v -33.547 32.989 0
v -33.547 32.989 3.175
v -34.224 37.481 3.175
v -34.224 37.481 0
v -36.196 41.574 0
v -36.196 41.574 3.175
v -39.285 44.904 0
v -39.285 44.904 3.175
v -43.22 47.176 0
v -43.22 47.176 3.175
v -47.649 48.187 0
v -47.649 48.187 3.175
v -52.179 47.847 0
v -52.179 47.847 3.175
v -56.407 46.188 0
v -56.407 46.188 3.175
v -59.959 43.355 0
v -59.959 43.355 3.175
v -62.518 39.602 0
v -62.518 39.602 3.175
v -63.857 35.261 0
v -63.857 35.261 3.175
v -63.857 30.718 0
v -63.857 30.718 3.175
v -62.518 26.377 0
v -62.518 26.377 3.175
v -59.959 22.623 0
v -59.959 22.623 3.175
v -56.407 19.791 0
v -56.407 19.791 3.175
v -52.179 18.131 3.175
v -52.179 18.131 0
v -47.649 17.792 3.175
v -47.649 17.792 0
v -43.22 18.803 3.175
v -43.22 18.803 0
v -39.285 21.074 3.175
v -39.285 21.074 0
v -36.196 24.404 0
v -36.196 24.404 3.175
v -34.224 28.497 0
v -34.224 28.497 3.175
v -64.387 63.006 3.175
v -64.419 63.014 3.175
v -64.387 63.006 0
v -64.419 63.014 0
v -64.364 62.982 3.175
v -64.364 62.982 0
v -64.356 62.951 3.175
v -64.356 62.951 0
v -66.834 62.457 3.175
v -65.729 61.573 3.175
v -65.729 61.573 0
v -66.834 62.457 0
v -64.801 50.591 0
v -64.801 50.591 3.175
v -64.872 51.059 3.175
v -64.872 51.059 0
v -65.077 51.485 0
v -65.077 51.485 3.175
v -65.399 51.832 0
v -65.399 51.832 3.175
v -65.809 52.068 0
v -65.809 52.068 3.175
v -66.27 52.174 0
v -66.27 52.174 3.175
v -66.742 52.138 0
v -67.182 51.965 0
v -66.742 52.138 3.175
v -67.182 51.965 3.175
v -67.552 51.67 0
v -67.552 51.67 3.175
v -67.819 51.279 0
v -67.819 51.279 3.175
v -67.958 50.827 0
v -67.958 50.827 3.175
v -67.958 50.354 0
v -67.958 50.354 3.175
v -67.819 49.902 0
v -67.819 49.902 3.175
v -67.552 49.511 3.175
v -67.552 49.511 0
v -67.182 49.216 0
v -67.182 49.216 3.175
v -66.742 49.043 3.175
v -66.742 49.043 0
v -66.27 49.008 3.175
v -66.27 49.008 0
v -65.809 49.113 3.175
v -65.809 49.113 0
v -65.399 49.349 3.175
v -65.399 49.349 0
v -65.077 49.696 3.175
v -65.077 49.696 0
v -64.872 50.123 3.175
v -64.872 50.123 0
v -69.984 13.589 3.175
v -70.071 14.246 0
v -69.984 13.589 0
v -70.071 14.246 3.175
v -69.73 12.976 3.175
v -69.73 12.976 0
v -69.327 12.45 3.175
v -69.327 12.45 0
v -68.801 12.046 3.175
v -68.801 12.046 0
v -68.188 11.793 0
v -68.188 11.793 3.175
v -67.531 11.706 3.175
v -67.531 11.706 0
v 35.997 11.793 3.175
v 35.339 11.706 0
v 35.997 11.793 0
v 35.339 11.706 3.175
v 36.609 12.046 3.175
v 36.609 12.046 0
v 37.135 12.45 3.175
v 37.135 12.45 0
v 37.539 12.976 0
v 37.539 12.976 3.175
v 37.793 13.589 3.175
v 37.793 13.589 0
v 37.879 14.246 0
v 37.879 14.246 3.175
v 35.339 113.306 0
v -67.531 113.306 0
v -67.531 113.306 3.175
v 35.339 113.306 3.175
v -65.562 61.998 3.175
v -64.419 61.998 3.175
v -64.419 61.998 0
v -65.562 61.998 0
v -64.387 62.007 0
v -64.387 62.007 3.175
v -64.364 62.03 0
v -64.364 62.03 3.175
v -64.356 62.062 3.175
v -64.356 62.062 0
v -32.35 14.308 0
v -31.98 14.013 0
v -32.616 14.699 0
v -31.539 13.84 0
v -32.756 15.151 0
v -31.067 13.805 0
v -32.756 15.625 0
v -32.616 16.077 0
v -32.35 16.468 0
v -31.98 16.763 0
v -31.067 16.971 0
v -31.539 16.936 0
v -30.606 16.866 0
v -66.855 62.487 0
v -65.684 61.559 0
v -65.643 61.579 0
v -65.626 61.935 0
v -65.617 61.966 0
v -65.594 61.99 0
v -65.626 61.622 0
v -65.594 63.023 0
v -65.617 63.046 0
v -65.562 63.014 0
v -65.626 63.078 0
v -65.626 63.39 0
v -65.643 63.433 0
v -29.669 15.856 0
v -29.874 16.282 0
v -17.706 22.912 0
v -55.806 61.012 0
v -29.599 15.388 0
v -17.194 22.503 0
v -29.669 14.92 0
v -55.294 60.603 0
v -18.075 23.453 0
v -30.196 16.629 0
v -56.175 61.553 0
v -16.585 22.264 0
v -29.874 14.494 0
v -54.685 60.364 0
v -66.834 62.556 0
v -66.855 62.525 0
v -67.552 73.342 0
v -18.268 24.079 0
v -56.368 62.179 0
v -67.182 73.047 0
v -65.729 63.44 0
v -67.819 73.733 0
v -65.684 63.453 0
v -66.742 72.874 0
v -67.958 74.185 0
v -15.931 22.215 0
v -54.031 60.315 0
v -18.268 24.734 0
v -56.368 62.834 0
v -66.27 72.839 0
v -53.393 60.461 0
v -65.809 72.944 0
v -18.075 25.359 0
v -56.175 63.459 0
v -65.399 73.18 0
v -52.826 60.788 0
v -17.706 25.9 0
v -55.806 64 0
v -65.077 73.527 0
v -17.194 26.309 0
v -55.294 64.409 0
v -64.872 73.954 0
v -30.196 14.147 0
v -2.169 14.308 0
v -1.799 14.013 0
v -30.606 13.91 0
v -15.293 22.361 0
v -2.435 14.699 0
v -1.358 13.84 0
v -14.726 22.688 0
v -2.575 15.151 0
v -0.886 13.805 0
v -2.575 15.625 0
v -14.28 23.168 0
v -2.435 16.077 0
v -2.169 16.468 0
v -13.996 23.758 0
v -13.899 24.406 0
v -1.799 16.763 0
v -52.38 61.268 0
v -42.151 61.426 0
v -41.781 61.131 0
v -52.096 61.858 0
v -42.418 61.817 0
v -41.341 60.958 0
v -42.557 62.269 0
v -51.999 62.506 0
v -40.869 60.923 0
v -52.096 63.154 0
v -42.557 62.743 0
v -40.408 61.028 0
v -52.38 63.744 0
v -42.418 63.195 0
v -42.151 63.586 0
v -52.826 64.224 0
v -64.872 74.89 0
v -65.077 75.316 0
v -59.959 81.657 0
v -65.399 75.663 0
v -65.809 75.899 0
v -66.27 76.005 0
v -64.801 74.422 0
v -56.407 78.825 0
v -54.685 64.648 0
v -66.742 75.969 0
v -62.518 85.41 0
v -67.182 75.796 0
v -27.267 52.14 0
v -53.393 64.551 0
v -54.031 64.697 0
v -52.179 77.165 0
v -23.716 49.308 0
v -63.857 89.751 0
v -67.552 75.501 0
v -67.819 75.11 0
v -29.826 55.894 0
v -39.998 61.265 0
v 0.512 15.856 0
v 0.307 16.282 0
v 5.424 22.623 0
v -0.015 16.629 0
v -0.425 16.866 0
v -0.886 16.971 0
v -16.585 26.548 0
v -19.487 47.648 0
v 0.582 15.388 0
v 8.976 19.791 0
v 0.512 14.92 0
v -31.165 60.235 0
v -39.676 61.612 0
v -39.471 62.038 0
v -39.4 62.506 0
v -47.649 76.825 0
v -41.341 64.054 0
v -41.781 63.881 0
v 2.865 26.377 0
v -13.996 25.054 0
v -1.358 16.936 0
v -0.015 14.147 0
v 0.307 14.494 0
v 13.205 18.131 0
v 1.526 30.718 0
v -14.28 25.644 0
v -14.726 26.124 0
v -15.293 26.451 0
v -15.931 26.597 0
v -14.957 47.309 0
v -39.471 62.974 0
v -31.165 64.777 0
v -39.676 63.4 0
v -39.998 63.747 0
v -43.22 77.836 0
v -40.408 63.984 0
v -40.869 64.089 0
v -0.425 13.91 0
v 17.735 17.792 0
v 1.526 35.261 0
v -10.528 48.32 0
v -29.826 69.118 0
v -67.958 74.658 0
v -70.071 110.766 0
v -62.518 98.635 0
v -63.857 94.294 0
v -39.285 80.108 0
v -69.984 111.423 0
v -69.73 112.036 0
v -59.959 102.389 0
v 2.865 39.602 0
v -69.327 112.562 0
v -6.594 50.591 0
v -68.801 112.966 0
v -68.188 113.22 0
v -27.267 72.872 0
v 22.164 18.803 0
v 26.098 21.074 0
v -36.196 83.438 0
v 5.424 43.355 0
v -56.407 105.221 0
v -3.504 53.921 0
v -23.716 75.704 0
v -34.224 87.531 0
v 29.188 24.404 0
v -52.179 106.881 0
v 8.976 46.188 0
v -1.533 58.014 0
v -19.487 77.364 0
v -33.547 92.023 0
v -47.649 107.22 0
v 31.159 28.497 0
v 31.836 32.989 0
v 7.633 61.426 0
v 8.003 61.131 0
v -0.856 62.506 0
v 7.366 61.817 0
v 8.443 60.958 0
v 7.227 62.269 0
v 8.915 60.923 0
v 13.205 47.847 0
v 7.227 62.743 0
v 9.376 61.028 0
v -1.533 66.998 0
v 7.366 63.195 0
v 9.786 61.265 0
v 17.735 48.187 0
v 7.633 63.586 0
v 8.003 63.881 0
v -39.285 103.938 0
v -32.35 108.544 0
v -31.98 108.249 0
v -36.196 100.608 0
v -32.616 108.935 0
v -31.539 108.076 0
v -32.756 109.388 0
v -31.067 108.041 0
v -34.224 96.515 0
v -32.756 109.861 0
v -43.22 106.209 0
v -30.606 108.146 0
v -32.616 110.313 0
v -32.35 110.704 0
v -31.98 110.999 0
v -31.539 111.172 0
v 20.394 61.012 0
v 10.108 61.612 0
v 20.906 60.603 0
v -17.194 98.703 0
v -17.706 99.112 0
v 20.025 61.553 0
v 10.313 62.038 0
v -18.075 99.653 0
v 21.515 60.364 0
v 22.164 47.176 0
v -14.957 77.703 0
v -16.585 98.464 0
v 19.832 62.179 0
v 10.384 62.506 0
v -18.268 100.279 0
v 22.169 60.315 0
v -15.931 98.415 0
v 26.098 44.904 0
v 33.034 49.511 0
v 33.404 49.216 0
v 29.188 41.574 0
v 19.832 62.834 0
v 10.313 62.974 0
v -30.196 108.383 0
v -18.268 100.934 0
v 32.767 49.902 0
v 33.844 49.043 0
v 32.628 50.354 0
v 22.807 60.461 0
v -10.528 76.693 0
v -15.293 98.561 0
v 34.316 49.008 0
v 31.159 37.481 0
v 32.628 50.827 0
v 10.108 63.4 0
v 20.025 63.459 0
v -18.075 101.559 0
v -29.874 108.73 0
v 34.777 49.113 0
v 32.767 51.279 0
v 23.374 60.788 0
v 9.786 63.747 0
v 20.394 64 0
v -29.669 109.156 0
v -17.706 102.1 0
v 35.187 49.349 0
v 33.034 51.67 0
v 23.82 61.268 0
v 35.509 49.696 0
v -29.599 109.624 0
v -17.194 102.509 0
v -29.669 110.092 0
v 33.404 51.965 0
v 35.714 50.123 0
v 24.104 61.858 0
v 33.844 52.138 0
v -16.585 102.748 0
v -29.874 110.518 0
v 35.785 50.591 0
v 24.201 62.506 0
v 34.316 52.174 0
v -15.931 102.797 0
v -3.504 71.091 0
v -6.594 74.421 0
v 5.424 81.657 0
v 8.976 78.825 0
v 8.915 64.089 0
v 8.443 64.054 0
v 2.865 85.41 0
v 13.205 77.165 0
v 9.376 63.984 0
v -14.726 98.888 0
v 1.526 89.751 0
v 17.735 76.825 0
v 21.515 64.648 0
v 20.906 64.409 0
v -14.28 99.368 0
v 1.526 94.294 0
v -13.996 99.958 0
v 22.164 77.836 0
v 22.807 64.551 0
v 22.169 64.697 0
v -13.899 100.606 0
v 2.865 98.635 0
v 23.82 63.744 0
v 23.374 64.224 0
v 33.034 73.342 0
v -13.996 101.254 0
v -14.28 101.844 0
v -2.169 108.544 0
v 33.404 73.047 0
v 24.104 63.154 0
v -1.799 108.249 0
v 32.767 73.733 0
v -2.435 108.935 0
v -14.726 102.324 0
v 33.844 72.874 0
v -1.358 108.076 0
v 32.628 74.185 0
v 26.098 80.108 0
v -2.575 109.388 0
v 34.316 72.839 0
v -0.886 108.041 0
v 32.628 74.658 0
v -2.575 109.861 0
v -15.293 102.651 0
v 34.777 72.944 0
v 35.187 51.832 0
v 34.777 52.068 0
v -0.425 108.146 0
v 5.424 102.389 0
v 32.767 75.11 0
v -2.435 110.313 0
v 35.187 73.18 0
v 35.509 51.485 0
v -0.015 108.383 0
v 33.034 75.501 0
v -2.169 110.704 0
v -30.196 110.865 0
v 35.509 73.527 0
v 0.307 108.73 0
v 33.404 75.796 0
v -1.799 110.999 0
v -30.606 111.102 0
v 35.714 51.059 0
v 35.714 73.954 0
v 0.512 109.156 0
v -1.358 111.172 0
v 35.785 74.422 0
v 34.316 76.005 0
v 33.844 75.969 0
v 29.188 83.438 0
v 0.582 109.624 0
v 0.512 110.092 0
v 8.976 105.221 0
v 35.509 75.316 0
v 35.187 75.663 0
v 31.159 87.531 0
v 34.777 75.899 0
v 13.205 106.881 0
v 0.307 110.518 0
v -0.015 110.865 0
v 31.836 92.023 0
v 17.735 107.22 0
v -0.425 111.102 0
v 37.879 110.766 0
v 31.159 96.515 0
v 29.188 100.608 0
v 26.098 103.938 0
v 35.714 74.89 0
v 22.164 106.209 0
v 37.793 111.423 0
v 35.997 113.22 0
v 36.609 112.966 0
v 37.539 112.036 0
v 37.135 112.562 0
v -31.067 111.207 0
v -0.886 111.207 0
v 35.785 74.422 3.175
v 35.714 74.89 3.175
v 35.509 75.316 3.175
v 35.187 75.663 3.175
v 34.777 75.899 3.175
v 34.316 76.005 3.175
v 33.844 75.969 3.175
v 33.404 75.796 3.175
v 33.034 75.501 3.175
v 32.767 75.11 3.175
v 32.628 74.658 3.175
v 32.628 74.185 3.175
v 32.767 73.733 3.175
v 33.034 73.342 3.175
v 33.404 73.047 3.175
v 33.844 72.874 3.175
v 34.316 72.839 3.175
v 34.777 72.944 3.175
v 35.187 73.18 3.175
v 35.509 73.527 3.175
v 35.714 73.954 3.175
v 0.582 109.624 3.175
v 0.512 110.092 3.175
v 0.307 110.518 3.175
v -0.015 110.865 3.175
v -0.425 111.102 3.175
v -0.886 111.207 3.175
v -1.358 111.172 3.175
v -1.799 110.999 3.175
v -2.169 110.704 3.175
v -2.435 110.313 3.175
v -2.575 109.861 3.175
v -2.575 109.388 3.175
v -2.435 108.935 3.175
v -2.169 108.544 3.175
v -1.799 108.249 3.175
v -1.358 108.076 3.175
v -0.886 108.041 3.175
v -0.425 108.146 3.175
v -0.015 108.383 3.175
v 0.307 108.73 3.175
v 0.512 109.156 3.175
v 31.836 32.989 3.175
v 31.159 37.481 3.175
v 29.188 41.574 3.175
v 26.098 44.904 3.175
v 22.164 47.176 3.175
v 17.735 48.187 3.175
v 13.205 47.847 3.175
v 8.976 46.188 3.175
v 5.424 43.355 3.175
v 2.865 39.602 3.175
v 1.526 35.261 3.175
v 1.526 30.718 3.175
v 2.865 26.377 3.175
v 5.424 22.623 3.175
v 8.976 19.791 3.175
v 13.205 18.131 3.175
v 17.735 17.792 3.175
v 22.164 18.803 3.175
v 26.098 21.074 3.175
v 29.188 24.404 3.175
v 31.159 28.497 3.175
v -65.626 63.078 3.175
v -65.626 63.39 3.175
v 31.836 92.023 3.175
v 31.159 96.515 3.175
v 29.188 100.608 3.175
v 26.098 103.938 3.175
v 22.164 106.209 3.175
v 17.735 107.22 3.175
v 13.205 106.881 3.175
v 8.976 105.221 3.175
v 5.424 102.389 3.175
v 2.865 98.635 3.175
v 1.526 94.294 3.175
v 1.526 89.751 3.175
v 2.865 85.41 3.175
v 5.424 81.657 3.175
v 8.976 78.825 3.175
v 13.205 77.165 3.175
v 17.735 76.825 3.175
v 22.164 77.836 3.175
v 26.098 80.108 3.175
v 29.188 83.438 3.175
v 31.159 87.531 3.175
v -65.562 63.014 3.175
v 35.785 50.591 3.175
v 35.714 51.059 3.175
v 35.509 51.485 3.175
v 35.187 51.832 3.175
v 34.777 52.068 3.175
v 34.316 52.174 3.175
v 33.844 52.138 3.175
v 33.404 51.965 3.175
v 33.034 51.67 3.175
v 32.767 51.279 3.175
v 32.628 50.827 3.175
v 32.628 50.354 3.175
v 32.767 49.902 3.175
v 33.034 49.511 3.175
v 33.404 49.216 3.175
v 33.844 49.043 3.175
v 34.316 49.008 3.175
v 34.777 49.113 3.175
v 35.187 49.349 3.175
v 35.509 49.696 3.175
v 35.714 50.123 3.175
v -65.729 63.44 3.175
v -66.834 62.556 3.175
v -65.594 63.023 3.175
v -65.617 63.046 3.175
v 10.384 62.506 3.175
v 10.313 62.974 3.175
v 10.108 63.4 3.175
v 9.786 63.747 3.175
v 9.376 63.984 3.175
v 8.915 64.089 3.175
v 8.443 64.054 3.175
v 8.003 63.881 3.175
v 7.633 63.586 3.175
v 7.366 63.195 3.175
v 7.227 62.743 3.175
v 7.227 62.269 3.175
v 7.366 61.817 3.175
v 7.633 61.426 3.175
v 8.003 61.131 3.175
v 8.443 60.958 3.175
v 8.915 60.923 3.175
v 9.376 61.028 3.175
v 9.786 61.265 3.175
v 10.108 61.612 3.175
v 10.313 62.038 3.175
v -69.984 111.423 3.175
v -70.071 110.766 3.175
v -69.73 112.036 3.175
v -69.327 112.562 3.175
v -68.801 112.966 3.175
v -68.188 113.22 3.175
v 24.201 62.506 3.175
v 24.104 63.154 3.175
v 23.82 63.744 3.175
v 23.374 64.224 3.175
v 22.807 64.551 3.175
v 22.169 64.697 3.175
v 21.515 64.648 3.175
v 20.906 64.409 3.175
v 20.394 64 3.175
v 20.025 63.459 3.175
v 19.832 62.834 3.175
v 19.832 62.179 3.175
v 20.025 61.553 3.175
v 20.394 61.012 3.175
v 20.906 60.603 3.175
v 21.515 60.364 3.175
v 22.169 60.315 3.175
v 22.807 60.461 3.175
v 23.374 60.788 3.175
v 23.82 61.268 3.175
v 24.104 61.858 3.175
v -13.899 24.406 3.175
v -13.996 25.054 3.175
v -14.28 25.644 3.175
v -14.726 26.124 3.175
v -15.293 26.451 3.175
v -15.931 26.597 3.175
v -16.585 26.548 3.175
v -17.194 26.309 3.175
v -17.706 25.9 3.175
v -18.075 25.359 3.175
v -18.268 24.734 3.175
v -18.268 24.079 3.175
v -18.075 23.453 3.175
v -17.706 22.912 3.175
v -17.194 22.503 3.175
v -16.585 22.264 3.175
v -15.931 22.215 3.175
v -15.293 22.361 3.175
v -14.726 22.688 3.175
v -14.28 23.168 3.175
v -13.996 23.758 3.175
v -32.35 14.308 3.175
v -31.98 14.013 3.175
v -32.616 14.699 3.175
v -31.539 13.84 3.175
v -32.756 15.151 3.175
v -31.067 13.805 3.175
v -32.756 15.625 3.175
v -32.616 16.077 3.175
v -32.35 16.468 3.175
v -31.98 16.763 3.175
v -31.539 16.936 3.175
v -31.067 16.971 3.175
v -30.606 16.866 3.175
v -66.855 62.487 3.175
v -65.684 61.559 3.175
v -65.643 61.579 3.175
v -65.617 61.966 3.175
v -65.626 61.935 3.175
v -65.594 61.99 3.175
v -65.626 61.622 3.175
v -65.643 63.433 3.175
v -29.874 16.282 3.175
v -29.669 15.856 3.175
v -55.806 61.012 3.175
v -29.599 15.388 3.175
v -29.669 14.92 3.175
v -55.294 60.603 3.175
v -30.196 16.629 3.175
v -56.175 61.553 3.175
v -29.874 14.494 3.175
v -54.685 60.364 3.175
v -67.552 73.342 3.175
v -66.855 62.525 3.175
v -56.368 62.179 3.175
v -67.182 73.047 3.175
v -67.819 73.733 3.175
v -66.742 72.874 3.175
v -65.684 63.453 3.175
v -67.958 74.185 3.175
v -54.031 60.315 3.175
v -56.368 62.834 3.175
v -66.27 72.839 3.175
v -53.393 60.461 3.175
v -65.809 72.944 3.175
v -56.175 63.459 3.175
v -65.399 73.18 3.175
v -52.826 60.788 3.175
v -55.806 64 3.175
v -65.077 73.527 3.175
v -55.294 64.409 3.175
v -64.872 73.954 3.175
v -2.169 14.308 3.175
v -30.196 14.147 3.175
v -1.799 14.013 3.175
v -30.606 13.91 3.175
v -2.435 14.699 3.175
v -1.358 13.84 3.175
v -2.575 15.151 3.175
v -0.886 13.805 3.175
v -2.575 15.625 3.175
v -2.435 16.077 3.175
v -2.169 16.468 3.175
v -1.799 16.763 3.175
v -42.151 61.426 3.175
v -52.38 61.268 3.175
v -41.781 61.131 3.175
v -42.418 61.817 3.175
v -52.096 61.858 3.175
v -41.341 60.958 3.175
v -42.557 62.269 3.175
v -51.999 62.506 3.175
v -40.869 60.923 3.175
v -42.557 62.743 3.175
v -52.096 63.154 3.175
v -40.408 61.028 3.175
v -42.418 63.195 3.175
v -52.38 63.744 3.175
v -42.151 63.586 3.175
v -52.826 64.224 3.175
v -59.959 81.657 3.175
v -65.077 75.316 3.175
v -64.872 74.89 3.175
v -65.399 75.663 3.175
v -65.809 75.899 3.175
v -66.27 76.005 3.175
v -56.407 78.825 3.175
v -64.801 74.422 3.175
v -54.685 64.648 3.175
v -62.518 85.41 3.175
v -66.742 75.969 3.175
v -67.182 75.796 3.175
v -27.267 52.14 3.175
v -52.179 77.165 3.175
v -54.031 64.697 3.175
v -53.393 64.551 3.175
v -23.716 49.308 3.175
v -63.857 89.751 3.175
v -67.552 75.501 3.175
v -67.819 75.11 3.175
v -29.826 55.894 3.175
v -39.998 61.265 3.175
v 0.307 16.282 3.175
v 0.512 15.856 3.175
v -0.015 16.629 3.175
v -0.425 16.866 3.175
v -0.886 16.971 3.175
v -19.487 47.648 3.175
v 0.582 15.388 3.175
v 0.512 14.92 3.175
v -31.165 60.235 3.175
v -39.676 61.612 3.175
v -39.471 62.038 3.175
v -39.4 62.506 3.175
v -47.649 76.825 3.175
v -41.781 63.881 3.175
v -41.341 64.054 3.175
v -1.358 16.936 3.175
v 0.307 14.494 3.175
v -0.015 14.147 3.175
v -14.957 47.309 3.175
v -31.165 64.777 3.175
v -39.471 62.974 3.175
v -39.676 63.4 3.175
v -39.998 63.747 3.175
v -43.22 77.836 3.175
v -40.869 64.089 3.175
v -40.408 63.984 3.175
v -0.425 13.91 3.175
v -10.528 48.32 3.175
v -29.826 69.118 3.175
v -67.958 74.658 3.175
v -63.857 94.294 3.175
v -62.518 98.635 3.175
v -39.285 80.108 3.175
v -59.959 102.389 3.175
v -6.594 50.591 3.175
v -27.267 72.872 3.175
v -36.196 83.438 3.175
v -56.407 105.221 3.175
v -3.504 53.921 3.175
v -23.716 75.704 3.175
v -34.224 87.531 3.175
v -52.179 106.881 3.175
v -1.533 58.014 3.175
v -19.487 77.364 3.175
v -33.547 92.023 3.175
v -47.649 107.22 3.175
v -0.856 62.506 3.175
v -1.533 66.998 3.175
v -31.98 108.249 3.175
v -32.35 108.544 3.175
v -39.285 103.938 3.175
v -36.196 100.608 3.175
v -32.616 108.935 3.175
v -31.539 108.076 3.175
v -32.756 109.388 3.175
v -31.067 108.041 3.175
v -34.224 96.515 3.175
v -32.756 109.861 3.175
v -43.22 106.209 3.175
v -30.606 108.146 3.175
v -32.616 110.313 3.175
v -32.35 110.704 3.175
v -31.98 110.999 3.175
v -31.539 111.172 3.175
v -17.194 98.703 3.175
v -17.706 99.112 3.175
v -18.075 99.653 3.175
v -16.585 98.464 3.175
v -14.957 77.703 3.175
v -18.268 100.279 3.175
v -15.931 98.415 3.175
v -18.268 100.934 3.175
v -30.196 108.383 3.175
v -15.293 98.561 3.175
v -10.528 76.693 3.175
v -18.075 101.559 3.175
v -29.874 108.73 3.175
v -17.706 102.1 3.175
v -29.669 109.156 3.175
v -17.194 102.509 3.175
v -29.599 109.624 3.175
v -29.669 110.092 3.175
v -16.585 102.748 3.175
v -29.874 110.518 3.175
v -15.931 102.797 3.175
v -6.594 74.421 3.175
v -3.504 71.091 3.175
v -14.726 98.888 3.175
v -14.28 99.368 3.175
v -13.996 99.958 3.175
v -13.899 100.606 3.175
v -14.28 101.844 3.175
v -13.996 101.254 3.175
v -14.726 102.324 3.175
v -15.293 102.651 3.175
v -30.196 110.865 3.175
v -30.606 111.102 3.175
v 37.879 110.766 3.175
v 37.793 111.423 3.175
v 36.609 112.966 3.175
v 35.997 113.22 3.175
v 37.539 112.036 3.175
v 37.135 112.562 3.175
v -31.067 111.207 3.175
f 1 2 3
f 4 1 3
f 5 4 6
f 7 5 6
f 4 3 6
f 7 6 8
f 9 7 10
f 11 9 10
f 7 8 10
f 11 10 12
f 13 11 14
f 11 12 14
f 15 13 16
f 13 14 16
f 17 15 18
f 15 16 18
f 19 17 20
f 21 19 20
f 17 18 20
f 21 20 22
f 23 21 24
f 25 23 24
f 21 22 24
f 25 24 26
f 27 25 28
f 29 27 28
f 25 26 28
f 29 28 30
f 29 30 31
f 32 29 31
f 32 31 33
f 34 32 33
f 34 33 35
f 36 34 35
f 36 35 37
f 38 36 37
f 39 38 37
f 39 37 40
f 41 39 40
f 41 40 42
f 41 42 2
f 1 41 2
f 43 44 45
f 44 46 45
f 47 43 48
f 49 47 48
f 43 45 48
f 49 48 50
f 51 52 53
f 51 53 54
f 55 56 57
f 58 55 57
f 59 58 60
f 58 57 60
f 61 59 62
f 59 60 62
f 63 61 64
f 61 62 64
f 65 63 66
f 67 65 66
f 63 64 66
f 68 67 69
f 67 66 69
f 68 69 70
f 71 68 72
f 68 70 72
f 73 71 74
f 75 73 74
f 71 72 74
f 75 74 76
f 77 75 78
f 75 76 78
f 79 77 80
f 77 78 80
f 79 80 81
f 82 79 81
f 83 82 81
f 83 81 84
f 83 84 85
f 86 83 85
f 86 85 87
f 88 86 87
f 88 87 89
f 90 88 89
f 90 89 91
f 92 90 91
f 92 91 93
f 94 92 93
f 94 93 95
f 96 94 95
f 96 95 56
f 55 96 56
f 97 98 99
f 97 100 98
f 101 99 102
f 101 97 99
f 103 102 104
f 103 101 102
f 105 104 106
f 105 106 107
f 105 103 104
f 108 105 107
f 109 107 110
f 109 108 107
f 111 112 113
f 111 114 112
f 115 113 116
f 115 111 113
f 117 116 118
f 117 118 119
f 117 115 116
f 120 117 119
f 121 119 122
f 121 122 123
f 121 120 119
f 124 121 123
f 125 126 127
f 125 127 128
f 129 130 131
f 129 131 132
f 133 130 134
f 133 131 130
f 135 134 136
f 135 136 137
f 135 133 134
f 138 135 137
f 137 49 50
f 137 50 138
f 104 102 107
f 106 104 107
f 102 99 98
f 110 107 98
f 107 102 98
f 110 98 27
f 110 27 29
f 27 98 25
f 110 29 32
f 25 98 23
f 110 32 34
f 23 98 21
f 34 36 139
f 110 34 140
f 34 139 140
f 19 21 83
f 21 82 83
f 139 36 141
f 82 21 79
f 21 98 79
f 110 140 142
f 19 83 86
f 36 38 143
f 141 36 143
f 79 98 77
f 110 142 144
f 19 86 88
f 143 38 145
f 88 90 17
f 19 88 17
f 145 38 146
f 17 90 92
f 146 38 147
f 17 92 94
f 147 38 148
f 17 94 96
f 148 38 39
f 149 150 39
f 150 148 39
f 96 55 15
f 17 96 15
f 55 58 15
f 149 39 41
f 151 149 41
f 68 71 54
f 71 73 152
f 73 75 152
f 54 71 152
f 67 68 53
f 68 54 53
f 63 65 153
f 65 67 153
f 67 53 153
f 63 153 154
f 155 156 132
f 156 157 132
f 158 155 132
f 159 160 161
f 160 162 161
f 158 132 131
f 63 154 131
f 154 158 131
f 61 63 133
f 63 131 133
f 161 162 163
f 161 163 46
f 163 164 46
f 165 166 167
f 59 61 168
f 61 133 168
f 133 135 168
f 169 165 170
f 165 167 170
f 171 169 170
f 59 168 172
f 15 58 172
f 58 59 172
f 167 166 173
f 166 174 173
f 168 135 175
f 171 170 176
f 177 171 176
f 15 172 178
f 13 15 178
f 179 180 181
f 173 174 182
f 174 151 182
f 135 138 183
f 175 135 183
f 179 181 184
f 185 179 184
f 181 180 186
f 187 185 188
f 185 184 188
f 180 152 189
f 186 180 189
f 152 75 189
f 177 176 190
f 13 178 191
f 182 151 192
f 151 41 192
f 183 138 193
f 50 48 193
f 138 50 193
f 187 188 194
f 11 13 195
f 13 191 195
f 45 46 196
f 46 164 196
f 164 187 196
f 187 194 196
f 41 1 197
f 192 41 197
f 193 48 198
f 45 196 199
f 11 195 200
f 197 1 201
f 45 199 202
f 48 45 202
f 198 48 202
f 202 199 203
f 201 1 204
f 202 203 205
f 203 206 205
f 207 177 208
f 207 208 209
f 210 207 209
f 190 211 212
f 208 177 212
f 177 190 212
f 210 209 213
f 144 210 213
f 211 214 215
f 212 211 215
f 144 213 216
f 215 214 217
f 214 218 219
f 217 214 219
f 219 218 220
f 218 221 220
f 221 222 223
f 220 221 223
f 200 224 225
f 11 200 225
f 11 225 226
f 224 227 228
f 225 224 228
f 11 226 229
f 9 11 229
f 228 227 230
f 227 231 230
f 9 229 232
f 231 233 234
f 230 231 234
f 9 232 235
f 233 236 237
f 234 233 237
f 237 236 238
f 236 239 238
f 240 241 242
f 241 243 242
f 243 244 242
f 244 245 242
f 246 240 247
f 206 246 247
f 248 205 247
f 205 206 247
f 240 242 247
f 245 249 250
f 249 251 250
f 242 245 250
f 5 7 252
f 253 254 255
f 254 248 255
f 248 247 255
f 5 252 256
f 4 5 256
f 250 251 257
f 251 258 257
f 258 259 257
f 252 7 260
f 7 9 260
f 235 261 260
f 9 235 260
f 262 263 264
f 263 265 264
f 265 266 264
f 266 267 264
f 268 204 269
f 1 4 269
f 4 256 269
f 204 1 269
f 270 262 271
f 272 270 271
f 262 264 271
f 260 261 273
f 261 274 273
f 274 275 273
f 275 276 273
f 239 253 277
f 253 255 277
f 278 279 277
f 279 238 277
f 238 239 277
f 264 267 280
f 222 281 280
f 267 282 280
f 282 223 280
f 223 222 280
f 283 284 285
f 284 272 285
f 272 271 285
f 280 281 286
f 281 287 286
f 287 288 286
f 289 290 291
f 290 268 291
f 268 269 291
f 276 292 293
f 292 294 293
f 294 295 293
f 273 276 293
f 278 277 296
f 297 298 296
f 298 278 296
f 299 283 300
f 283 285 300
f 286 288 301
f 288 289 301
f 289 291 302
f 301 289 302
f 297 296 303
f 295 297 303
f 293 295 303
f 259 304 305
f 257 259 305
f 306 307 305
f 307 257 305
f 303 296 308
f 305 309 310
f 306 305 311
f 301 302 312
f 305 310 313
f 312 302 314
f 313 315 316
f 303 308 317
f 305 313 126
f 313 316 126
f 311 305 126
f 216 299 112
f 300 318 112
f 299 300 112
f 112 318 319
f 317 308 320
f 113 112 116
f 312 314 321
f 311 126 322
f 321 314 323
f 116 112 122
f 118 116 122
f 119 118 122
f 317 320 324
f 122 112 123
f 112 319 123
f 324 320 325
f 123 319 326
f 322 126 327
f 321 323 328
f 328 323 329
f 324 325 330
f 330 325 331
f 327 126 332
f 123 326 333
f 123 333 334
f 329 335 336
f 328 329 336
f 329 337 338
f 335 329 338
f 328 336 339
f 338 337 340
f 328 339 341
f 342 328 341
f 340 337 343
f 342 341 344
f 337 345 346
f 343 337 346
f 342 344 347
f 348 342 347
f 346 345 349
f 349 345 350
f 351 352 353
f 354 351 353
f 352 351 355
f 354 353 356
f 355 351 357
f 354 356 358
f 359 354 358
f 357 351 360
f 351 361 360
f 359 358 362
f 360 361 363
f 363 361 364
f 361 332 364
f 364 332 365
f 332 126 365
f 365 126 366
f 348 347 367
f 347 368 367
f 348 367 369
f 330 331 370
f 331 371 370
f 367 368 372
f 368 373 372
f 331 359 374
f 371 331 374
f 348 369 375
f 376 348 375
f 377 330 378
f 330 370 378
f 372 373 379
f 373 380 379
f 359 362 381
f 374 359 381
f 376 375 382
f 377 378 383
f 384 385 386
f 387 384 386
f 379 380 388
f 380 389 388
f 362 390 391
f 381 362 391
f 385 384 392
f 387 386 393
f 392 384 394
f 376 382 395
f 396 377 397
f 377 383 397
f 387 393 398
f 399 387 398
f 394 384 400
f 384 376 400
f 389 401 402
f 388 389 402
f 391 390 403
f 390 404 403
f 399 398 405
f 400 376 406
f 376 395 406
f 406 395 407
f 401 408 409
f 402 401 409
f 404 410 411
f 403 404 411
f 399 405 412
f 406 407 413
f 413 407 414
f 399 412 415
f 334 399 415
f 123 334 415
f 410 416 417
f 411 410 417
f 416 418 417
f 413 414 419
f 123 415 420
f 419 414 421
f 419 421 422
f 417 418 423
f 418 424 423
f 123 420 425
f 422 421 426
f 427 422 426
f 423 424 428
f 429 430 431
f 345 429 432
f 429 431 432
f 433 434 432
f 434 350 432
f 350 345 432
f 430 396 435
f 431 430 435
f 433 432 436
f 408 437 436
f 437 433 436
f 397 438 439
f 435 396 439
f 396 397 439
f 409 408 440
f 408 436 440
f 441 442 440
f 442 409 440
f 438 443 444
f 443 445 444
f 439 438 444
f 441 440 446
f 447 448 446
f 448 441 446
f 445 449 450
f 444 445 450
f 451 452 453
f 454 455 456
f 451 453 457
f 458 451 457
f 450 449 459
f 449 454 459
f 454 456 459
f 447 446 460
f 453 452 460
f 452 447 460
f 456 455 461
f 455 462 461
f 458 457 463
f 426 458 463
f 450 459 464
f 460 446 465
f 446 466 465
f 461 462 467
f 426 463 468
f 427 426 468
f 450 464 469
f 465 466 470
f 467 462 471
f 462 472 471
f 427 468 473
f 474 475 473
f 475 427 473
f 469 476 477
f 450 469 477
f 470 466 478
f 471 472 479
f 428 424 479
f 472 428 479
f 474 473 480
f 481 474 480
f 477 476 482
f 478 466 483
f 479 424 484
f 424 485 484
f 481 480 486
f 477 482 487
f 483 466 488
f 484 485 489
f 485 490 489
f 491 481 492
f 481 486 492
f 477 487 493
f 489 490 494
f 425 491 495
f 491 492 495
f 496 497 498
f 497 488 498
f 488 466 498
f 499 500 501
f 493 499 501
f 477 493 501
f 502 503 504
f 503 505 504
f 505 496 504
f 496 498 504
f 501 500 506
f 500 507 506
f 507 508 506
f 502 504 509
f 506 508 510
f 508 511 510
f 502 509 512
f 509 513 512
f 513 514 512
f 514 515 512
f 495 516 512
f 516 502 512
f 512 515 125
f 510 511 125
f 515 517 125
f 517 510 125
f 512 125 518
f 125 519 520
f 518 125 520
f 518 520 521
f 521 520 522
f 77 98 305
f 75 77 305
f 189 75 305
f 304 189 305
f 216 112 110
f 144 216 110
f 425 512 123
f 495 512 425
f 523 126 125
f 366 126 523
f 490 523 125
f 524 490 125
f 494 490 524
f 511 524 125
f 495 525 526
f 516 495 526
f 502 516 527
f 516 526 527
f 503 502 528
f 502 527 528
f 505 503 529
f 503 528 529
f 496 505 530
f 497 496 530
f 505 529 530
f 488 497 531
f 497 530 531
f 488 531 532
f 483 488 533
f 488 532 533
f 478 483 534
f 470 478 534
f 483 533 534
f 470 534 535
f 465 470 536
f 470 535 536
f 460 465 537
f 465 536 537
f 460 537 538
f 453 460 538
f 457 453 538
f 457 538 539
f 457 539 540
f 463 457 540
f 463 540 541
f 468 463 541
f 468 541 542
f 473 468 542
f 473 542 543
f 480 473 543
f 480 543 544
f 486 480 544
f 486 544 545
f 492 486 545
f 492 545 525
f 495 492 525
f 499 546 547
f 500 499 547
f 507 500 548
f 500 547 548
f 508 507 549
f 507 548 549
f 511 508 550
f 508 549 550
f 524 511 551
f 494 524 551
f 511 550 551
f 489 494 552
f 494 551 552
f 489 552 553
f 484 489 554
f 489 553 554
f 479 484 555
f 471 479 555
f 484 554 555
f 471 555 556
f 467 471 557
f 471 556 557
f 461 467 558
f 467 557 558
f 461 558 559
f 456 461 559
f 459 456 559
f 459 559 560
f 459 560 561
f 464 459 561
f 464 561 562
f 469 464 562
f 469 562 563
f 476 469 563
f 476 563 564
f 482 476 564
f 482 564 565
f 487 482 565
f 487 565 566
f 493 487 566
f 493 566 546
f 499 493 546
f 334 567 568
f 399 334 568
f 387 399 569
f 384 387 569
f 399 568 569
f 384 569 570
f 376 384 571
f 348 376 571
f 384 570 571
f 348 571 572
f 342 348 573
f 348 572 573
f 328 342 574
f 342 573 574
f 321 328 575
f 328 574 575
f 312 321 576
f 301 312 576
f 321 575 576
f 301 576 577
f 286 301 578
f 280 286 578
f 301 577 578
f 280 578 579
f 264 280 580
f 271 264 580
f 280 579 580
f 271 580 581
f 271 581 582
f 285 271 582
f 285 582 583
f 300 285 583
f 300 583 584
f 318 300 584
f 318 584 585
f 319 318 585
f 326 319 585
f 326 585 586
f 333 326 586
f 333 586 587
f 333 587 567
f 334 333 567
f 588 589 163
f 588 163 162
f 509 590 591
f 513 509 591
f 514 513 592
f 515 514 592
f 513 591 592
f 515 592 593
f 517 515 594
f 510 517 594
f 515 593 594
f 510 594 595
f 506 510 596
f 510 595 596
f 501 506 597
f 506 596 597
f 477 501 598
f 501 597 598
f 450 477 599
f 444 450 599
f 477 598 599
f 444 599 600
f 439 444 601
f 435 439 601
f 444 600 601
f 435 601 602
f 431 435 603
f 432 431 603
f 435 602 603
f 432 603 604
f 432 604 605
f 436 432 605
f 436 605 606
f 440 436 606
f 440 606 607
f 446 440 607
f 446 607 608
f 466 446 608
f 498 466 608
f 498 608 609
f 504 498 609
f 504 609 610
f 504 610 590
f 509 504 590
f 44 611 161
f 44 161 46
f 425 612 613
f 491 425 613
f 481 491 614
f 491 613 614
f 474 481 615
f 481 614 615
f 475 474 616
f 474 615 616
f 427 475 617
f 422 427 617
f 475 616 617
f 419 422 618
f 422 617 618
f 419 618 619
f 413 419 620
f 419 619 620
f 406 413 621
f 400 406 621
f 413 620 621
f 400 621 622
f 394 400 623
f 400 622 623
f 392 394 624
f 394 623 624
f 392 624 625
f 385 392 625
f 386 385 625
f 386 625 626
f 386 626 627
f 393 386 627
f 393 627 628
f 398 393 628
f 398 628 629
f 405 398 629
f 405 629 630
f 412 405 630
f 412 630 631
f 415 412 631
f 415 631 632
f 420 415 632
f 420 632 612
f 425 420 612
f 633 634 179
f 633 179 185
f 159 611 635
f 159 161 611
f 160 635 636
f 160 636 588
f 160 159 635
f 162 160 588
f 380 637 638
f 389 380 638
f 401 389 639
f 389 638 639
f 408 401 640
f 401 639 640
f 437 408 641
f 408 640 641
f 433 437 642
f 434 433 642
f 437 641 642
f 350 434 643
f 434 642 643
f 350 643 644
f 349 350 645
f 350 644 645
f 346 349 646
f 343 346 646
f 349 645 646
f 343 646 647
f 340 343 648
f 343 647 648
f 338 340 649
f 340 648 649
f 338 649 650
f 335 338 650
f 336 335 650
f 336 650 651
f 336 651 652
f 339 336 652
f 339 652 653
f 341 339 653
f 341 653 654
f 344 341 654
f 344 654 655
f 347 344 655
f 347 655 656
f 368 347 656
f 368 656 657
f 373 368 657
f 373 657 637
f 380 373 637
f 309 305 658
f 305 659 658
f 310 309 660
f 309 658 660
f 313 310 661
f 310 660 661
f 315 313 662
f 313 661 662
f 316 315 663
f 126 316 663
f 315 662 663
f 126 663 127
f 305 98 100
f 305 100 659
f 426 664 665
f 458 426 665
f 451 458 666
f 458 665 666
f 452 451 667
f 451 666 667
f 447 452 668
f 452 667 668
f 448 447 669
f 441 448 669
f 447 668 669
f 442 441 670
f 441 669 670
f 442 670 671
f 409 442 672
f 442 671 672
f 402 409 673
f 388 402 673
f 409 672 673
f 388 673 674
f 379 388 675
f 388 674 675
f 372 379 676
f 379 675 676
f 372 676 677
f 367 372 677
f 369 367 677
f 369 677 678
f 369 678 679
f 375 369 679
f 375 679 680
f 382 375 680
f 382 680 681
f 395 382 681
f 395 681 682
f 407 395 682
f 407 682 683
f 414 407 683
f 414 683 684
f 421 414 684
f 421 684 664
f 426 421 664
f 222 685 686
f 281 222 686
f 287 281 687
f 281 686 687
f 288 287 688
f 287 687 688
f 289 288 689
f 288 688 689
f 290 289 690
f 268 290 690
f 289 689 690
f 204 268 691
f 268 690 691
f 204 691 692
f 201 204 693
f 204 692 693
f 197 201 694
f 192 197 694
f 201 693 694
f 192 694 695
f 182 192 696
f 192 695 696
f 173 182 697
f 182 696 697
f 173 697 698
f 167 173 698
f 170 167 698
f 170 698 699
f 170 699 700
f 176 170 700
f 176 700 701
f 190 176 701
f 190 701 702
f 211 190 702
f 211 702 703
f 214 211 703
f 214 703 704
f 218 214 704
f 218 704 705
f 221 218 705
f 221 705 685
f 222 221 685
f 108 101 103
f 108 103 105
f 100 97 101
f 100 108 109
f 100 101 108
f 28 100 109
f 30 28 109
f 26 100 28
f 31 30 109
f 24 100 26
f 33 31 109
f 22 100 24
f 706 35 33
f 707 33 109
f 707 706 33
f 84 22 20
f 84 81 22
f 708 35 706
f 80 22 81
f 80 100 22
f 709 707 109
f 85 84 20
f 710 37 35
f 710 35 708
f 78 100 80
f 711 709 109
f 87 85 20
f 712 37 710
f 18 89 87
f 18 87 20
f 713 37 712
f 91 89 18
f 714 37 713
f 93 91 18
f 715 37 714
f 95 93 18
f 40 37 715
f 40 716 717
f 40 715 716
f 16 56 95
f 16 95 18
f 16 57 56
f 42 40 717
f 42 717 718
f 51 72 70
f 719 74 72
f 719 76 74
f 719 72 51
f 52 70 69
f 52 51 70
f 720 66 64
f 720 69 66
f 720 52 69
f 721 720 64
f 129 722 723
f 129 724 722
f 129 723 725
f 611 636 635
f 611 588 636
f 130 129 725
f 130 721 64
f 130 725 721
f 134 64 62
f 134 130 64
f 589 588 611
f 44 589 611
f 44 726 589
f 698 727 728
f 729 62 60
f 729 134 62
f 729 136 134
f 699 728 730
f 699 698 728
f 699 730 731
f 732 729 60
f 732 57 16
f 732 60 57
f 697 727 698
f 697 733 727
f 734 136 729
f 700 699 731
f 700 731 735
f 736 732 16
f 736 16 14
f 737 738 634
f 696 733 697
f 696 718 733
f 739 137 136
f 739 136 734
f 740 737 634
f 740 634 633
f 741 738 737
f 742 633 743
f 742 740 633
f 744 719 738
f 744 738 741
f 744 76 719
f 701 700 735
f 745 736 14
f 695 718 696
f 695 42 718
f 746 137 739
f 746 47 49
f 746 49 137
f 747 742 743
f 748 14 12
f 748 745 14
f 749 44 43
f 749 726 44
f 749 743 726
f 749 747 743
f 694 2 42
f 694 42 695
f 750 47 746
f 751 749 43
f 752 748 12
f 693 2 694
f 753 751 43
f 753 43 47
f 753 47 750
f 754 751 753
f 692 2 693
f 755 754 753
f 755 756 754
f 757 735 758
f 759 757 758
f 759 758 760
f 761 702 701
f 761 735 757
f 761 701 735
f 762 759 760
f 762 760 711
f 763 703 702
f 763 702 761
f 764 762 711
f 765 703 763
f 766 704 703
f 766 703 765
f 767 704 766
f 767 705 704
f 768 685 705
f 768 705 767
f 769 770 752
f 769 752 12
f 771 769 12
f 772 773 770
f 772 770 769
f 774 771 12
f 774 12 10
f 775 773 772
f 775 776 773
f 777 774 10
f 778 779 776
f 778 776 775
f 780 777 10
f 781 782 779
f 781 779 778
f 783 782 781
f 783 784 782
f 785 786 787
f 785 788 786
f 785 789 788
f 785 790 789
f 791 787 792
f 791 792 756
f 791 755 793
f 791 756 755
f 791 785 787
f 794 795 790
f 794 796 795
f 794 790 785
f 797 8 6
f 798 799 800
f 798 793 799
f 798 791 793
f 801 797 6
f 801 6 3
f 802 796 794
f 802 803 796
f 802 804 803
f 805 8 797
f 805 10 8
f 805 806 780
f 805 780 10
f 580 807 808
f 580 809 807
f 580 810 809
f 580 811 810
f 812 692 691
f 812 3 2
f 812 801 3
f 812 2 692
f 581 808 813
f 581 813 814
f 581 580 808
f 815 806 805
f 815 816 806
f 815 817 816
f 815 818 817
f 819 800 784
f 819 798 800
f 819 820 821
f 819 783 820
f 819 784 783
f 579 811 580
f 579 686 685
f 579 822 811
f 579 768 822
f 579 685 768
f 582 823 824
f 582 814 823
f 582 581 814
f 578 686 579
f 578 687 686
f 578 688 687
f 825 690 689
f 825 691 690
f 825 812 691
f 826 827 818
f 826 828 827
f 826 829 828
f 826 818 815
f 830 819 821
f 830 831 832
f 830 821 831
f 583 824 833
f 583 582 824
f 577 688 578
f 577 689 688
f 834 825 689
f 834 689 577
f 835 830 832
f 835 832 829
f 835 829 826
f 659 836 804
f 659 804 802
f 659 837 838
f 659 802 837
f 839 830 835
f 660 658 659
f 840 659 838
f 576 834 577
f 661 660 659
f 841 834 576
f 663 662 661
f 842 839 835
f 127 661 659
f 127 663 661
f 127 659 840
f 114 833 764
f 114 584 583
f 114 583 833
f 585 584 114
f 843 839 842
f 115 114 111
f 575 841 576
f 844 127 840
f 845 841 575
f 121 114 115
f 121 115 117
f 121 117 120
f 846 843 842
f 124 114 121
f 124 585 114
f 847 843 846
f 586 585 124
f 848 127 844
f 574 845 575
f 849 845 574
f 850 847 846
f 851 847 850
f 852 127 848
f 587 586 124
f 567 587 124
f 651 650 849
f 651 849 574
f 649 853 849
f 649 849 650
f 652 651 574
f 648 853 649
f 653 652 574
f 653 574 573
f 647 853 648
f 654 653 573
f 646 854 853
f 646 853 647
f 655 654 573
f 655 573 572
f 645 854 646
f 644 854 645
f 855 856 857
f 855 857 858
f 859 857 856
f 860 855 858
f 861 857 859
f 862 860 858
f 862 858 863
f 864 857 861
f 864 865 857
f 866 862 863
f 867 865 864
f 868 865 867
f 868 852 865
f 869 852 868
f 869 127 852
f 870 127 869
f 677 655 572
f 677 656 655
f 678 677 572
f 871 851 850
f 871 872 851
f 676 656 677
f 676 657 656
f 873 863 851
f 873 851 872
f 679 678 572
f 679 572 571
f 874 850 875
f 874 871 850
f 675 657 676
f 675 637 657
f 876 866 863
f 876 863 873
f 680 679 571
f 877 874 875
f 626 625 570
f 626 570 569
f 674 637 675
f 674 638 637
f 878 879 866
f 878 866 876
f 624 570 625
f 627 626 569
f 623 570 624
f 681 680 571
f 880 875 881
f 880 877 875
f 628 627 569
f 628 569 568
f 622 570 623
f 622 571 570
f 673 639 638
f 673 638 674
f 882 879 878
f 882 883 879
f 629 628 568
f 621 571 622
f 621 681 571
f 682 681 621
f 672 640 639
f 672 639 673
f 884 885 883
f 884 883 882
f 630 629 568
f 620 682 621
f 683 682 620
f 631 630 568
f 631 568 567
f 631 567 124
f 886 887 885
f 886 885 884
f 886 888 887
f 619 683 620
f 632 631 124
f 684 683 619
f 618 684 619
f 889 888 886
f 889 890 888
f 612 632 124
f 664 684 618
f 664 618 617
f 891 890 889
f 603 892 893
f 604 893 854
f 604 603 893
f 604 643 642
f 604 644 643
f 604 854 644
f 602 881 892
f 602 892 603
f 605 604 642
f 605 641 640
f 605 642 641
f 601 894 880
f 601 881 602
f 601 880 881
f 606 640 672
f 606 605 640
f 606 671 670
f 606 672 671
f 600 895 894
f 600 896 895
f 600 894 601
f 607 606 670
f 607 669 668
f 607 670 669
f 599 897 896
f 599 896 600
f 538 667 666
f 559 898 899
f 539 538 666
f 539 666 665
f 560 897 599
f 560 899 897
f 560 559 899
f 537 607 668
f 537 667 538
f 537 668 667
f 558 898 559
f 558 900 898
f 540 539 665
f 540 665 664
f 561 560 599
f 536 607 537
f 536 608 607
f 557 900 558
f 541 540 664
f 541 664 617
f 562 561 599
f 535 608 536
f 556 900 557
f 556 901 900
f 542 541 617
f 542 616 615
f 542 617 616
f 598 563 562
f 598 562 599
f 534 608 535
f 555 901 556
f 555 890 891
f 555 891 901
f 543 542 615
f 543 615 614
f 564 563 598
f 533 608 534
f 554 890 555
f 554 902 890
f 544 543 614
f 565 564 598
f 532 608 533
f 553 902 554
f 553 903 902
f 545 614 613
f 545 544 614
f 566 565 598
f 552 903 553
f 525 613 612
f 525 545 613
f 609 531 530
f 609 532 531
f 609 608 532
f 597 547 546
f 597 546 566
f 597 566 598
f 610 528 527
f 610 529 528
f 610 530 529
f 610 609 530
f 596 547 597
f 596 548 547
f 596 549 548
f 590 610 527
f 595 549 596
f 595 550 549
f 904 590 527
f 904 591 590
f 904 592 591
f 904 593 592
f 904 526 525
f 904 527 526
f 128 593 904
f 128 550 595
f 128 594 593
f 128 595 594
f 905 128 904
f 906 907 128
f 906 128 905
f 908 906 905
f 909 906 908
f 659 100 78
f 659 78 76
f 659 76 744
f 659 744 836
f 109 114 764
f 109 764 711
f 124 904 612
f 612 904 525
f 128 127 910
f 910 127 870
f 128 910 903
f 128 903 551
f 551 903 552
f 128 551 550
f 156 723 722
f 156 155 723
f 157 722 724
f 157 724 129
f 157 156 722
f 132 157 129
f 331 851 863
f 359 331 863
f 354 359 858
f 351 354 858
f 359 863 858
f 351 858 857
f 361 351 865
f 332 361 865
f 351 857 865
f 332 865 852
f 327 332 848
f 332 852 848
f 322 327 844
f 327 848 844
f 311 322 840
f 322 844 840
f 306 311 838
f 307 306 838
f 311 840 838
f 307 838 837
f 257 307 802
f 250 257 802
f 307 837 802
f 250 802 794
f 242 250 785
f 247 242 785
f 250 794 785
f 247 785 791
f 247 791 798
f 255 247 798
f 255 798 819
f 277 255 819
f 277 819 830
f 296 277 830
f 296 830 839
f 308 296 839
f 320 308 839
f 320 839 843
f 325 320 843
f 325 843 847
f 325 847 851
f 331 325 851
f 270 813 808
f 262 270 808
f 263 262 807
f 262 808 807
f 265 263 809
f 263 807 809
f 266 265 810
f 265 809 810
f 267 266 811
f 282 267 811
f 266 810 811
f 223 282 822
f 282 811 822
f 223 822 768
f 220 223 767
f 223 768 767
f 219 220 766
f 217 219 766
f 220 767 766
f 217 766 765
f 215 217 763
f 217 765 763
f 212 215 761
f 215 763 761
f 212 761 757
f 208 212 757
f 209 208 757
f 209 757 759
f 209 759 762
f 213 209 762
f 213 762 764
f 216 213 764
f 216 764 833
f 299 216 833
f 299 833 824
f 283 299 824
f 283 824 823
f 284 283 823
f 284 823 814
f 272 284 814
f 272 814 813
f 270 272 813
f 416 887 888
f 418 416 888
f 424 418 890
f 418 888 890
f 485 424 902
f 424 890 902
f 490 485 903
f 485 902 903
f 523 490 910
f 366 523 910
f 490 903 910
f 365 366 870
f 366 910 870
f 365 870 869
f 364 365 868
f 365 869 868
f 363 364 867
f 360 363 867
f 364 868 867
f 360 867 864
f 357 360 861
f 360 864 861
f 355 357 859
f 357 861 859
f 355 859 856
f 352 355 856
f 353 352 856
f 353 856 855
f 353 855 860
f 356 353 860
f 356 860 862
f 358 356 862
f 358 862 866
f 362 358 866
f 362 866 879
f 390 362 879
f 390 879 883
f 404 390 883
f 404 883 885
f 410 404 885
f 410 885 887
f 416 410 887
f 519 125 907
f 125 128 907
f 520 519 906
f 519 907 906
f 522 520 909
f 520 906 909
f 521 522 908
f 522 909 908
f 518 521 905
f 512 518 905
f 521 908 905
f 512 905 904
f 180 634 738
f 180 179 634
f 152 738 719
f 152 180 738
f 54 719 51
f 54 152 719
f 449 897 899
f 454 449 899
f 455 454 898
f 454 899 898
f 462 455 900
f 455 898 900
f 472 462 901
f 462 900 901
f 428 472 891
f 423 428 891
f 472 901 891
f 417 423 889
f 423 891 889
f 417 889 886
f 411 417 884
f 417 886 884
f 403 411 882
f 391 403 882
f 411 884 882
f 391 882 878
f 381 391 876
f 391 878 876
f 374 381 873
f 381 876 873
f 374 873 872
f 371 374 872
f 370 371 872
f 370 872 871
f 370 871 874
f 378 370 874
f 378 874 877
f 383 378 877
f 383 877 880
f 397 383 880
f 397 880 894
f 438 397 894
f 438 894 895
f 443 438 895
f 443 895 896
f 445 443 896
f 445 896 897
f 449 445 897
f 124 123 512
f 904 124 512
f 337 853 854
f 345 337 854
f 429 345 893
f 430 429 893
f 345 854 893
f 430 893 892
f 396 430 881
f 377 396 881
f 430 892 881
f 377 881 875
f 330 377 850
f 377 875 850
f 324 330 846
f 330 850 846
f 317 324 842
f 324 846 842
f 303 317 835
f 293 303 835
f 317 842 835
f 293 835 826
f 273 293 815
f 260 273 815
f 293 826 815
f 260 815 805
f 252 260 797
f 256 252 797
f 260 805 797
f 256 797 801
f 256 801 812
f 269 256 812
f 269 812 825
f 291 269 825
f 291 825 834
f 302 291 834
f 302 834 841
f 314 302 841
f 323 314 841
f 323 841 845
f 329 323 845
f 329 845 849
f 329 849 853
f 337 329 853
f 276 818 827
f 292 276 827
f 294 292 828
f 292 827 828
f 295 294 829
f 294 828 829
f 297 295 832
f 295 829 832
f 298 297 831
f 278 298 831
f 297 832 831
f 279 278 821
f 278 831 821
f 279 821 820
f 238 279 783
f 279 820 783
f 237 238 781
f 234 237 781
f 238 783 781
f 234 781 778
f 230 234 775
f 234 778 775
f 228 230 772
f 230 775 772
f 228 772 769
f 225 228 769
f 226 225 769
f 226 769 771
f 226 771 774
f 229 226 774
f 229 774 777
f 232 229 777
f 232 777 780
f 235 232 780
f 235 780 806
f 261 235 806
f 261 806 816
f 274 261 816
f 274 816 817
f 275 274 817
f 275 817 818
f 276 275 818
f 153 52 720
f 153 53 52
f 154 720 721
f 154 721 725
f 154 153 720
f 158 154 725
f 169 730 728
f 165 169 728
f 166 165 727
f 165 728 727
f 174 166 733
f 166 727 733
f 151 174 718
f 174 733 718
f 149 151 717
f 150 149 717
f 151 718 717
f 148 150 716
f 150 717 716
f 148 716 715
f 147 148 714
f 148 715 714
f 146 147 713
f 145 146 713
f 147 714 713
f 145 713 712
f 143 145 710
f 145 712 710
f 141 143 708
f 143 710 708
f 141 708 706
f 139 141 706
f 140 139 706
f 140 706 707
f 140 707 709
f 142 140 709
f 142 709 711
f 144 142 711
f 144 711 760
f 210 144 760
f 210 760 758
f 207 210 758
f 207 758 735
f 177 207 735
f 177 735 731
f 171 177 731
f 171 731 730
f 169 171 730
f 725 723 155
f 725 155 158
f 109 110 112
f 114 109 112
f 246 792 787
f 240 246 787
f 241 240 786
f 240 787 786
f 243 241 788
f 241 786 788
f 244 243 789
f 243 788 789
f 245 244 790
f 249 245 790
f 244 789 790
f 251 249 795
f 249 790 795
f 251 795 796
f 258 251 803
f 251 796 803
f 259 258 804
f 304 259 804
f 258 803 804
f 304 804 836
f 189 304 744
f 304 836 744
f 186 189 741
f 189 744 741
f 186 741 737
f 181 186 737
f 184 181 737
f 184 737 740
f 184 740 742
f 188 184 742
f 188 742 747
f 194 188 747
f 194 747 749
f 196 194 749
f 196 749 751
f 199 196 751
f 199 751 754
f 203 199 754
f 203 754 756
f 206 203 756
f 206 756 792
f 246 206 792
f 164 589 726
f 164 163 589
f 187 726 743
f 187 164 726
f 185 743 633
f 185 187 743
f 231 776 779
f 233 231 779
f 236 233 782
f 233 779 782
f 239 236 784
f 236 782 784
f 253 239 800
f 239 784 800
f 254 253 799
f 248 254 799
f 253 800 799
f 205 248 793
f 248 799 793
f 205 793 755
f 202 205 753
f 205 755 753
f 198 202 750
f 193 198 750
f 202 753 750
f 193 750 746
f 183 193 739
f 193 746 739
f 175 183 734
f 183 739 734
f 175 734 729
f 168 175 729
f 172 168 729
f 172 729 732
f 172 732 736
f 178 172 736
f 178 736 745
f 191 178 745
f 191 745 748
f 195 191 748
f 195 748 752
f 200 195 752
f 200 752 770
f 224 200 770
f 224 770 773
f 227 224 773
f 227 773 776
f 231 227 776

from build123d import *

# Parameters (mm, degrees)
SKETCH1_W           = 107.95
SKETCH1_H           = 101.6
BOSS_EXTRUDE1_DEPTH = 3.175
CUT_EXTRUDE1_REACH  = 5.175
SKETCH2_R           = 15.24
CUT_EXTRUDE2_REACH  = 5.175
SKETCH3_R           = 1.5875
CUT_EXTRUDE3_REACH  = 5.175
SKETCH4_R           = 2.1971
FILLET1_R           = 2.54
CUT_EXTRUDE4_DEPTH  = 4.175
FILLET3_R           = 0.0635


with BuildPart() as part:
    # Sketch1 → Boss-Extrude1 (new body)
    with BuildSketch(Plane.XY):
        with Locations((-16.095613336, 62.506086957)):
            Rectangle(SKETCH1_W, SKETCH1_H)
    extrude(amount=BOSS_EXTRUDE1_DEPTH)

    # Sketch2 → Cut-Extrude1 (cut, up to next)
    with BuildSketch(Plane.XY.offset(3.175), mode=Mode.PRIVATE) as cut_extrude1_sk1:
        with Locations((-16.095613336, 62.506086957)):
            Circle(SKETCH2_R)
    cut_extrude1_tool1 = extrude(cut_extrude1_sk1.sketch, amount=-CUT_EXTRUDE1_REACH, mode=Mode.PRIVATE) & part.part
    add(cut_extrude1_tool1.solids().sort_by_distance((-16.095613, 62.506087, 3.175))[0], mode=Mode.SUBTRACT)
    # Sketch2 → Cut-Extrude1 (cut, up to next)
    with BuildSketch(Plane.XY.offset(3.175), mode=Mode.PRIVATE) as cut_extrude1_sk2:
        with Locations((16.596179657, 32.989293963)):
            Circle(SKETCH2_R)
    cut_extrude1_tool2 = extrude(cut_extrude1_sk2.sketch, amount=-CUT_EXTRUDE1_REACH, mode=Mode.PRIVATE) & part.part
    add(cut_extrude1_tool2.solids().sort_by_distance((16.59618, 32.989294, 3.175))[0], mode=Mode.SUBTRACT)
    # Sketch2 → Cut-Extrude1 (cut, up to next)
    with BuildSketch(Plane.XY.offset(3.175), mode=Mode.PRIVATE) as cut_extrude1_sk3:
        with Locations((16.596179657, 92.02287995)):
            Circle(SKETCH2_R)
    cut_extrude1_tool3 = extrude(cut_extrude1_sk3.sketch, amount=-CUT_EXTRUDE1_REACH, mode=Mode.PRIVATE) & part.part
    add(cut_extrude1_tool3.solids().sort_by_distance((16.59618, 92.02288, 3.175))[0], mode=Mode.SUBTRACT)
    # Sketch2 → Cut-Extrude1 (cut, up to next)
    with BuildSketch(Plane.XY.offset(3.175), mode=Mode.PRIVATE) as cut_extrude1_sk4:
        with Locations((-48.787406329, 92.02287995)):
            Circle(SKETCH2_R)
    cut_extrude1_tool4 = extrude(cut_extrude1_sk4.sketch, amount=-CUT_EXTRUDE1_REACH, mode=Mode.PRIVATE) & part.part
    add(cut_extrude1_tool4.solids().sort_by_distance((-48.787406, 92.02288, 3.175))[0], mode=Mode.SUBTRACT)
    # Sketch2 → Cut-Extrude1 (cut, up to next)
    with BuildSketch(Plane.XY.offset(3.175), mode=Mode.PRIVATE) as cut_extrude1_sk5:
        with Locations((-48.787406329, 32.989293963)):
            Circle(SKETCH2_R)
    cut_extrude1_tool5 = extrude(cut_extrude1_sk5.sketch, amount=-CUT_EXTRUDE1_REACH, mode=Mode.PRIVATE) & part.part
    add(cut_extrude1_tool5.solids().sort_by_distance((-48.787406, 32.989294, 3.175))[0], mode=Mode.SUBTRACT)

    # Sketch3 → Cut-Extrude2 (cut, up to next)
    with BuildSketch(Plane.XY.offset(3.175), mode=Mode.PRIVATE) as cut_extrude2_sk1:
        with Locations((-31.186104332, 109.624181947)):
            Circle(SKETCH3_R)
    cut_extrude2_tool1 = extrude(cut_extrude2_sk1.sketch, amount=-CUT_EXTRUDE2_REACH, mode=Mode.PRIVATE) & part.part
    add(cut_extrude2_tool1.solids().sort_by_distance((-31.186104, 109.624182, 3.175))[0], mode=Mode.SUBTRACT)
    # Sketch3 → Cut-Extrude2 (cut, up to next)
    with BuildSketch(Plane.XY.offset(3.175), mode=Mode.PRIVATE) as cut_extrude2_sk2:
        with Locations((-66.388708326, 74.421577952)):
            Circle(SKETCH3_R)
    cut_extrude2_tool2 = extrude(cut_extrude2_sk2.sketch, amount=-CUT_EXTRUDE2_REACH, mode=Mode.PRIVATE) & part.part
    add(cut_extrude2_tool2.solids().sort_by_distance((-66.388708, 74.421578, 3.175))[0], mode=Mode.SUBTRACT)
    # Sketch3 → Cut-Extrude2 (cut, up to next)
    with BuildSketch(Plane.XY.offset(3.175), mode=Mode.PRIVATE) as cut_extrude2_sk3:
        with Locations((-1.00512234, 109.624181947)):
            Circle(SKETCH3_R)
    cut_extrude2_tool3 = extrude(cut_extrude2_sk3.sketch, amount=-CUT_EXTRUDE2_REACH, mode=Mode.PRIVATE) & part.part
    add(cut_extrude2_tool3.solids().sort_by_distance((-1.005122, 109.624182, 3.175))[0], mode=Mode.SUBTRACT)
    # Sketch3 → Cut-Extrude2 (cut, up to next)
    with BuildSketch(Plane.XY.offset(3.175), mode=Mode.PRIVATE) as cut_extrude2_sk4:
        with Locations((34.197481654, 74.421577952)):
            Circle(SKETCH3_R)
    cut_extrude2_tool4 = extrude(cut_extrude2_sk4.sketch, amount=-CUT_EXTRUDE2_REACH, mode=Mode.PRIVATE) & part.part
    add(cut_extrude2_tool4.solids().sort_by_distance((34.197482, 74.421578, 3.175))[0], mode=Mode.SUBTRACT)
    # Sketch3 → Cut-Extrude2 (cut, up to next)
    with BuildSketch(Plane.XY.offset(3.175), mode=Mode.PRIVATE) as cut_extrude2_sk5:
        with Locations((-31.186104332, 15.387991966)):
            Circle(SKETCH3_R)
    cut_extrude2_tool5 = extrude(cut_extrude2_sk5.sketch, amount=-CUT_EXTRUDE2_REACH, mode=Mode.PRIVATE) & part.part
    add(cut_extrude2_tool5.solids().sort_by_distance((-31.186104, 15.387992, 3.175))[0], mode=Mode.SUBTRACT)
    # Sketch3 → Cut-Extrude2 (cut, up to next)
    with BuildSketch(Plane.XY.offset(3.175), mode=Mode.PRIVATE) as cut_extrude2_sk6:
        with Locations((-66.388708326, 50.590595961)):
            Circle(SKETCH3_R)
    cut_extrude2_tool6 = extrude(cut_extrude2_sk6.sketch, amount=-CUT_EXTRUDE2_REACH, mode=Mode.PRIVATE) & part.part
    add(cut_extrude2_tool6.solids().sort_by_distance((-66.388708, 50.590596, 3.175))[0], mode=Mode.SUBTRACT)
    # Sketch3 → Cut-Extrude2 (cut, up to next)
    with BuildSketch(Plane.XY.offset(3.175), mode=Mode.PRIVATE) as cut_extrude2_sk7:
        with Locations((-1.00512234, 15.387991966)):
            Circle(SKETCH3_R)
    cut_extrude2_tool7 = extrude(cut_extrude2_sk7.sketch, amount=-CUT_EXTRUDE2_REACH, mode=Mode.PRIVATE) & part.part
    add(cut_extrude2_tool7.solids().sort_by_distance((-1.005122, 15.387992, 3.175))[0], mode=Mode.SUBTRACT)
    # Sketch3 → Cut-Extrude2 (cut, up to next)
    with BuildSketch(Plane.XY.offset(3.175), mode=Mode.PRIVATE) as cut_extrude2_sk8:
        with Locations((34.197481654, 50.590595961)):
            Circle(SKETCH3_R)
    cut_extrude2_tool8 = extrude(cut_extrude2_sk8.sketch, amount=-CUT_EXTRUDE2_REACH, mode=Mode.PRIVATE) & part.part
    add(cut_extrude2_tool8.solids().sort_by_distance((34.197482, 50.590596, 3.175))[0], mode=Mode.SUBTRACT)
    # Sketch3 → Cut-Extrude2 (cut, up to next)
    with BuildSketch(Plane.XY.offset(3.175), mode=Mode.PRIVATE) as cut_extrude2_sk9:
        with Locations((8.796386664, 62.506086957)):
            Circle(SKETCH3_R)
    cut_extrude2_tool9 = extrude(cut_extrude2_sk9.sketch, amount=-CUT_EXTRUDE2_REACH, mode=Mode.PRIVATE) & part.part
    add(cut_extrude2_tool9.solids().sort_by_distance((8.796387, 62.506087, 3.175))[0], mode=Mode.SUBTRACT)
    # Sketch3 → Cut-Extrude2 (cut, up to next)
    with BuildSketch(Plane.XY.offset(3.175), mode=Mode.PRIVATE) as cut_extrude2_sk10:
        with Locations((-40.987613336, 62.506086957)):
            Circle(SKETCH3_R)
    cut_extrude2_tool10 = extrude(cut_extrude2_sk10.sketch, amount=-CUT_EXTRUDE2_REACH, mode=Mode.PRIVATE) & part.part
    add(cut_extrude2_tool10.solids().sort_by_distance((-40.987613, 62.506087, 3.175))[0], mode=Mode.SUBTRACT)

    # Sketch4 → Cut-Extrude3 (cut, up to next)
    with BuildSketch(Plane.XY.offset(3.175), mode=Mode.PRIVATE) as cut_extrude3_sk1:
        with Locations((-16.095613336, 100.606086957)):
            Circle(SKETCH4_R)
    cut_extrude3_tool1 = extrude(cut_extrude3_sk1.sketch, amount=-CUT_EXTRUDE3_REACH, mode=Mode.PRIVATE) & part.part
    add(cut_extrude3_tool1.solids().sort_by_distance((-16.095613, 100.606087, 3.175))[0], mode=Mode.SUBTRACT)
    # Sketch4 → Cut-Extrude3 (cut, up to next)
    with BuildSketch(Plane.XY.offset(3.175), mode=Mode.PRIVATE) as cut_extrude3_sk2:
        with Locations((-16.095613336, 24.406086957)):
            Circle(SKETCH4_R)
    cut_extrude3_tool2 = extrude(cut_extrude3_sk2.sketch, amount=-CUT_EXTRUDE3_REACH, mode=Mode.PRIVATE) & part.part
    add(cut_extrude3_tool2.solids().sort_by_distance((-16.095613, 24.406087, 3.175))[0], mode=Mode.SUBTRACT)
    # Sketch4 → Cut-Extrude3 (cut, up to next)
    with BuildSketch(Plane.XY.offset(3.175), mode=Mode.PRIVATE) as cut_extrude3_sk3:
        with Locations((-54.195613336, 62.506086957)):
            Circle(SKETCH4_R)
    cut_extrude3_tool3 = extrude(cut_extrude3_sk3.sketch, amount=-CUT_EXTRUDE3_REACH, mode=Mode.PRIVATE) & part.part
    add(cut_extrude3_tool3.solids().sort_by_distance((-54.195613, 62.506087, 3.175))[0], mode=Mode.SUBTRACT)
    # Sketch4 → Cut-Extrude3 (cut, up to next)
    with BuildSketch(Plane.XY.offset(3.175), mode=Mode.PRIVATE) as cut_extrude3_sk4:
        with Locations((22.004386664, 62.506086957)):
            Circle(SKETCH4_R)
    cut_extrude3_tool4 = extrude(cut_extrude3_sk4.sketch, amount=-CUT_EXTRUDE3_REACH, mode=Mode.PRIVATE) & part.part
    add(cut_extrude3_tool4.solids().sort_by_distance((22.004387, 62.506087, 3.175))[0], mode=Mode.SUBTRACT)

    # Fillet1
    fillet1_edges = [part.edges().sort_by_distance(p)[0] for p in [
        (37.879386664, 11.706086957, 1.5875),
        (-70.070613336, 11.706086957, 1.5875),
        (-70.070613336, 113.306086957, 1.5875),
        (37.879386664, 113.306086957, 1.5875),
    ]]
    fillet(fillet1_edges, radius=FILLET1_R)

    # Sketch5 → Cut-Extrude4 (cut, through all)
    with BuildSketch(Plane.XY.offset(3.175)):
        Polygon((-64.355613336, 63.014086957), (-64.355613336, 61.998086957), (-65.625613336, 61.998086957), (-65.625613336, 61.490086957), (-66.895613336, 62.506086957), (-65.625613336, 63.522086957), (-65.625613336, 63.014086957), align=None)
    extrude(amount=-CUT_EXTRUDE4_DEPTH, mode=Mode.SUBTRACT)

    # Fillet3
    fillet3_edges = [part.edges().sort_by_distance(p)[0] for p in [
        (-65.625613336, 61.998086957, 1.5875),
        (-65.625613336, 61.490086957, 1.5875),
        (-66.895613336, 62.506086957, 1.5875),
        (-65.625613336, 63.522086957, 1.5875),
        (-65.625613336, 63.014086957, 1.5875),
        (-64.355613336, 63.014086957, 1.5875),
        (-64.355613336, 61.998086957, 1.5875),
    ]]
    fillet(fillet3_edges, radius=FILLET3_R)


solid = part.part
